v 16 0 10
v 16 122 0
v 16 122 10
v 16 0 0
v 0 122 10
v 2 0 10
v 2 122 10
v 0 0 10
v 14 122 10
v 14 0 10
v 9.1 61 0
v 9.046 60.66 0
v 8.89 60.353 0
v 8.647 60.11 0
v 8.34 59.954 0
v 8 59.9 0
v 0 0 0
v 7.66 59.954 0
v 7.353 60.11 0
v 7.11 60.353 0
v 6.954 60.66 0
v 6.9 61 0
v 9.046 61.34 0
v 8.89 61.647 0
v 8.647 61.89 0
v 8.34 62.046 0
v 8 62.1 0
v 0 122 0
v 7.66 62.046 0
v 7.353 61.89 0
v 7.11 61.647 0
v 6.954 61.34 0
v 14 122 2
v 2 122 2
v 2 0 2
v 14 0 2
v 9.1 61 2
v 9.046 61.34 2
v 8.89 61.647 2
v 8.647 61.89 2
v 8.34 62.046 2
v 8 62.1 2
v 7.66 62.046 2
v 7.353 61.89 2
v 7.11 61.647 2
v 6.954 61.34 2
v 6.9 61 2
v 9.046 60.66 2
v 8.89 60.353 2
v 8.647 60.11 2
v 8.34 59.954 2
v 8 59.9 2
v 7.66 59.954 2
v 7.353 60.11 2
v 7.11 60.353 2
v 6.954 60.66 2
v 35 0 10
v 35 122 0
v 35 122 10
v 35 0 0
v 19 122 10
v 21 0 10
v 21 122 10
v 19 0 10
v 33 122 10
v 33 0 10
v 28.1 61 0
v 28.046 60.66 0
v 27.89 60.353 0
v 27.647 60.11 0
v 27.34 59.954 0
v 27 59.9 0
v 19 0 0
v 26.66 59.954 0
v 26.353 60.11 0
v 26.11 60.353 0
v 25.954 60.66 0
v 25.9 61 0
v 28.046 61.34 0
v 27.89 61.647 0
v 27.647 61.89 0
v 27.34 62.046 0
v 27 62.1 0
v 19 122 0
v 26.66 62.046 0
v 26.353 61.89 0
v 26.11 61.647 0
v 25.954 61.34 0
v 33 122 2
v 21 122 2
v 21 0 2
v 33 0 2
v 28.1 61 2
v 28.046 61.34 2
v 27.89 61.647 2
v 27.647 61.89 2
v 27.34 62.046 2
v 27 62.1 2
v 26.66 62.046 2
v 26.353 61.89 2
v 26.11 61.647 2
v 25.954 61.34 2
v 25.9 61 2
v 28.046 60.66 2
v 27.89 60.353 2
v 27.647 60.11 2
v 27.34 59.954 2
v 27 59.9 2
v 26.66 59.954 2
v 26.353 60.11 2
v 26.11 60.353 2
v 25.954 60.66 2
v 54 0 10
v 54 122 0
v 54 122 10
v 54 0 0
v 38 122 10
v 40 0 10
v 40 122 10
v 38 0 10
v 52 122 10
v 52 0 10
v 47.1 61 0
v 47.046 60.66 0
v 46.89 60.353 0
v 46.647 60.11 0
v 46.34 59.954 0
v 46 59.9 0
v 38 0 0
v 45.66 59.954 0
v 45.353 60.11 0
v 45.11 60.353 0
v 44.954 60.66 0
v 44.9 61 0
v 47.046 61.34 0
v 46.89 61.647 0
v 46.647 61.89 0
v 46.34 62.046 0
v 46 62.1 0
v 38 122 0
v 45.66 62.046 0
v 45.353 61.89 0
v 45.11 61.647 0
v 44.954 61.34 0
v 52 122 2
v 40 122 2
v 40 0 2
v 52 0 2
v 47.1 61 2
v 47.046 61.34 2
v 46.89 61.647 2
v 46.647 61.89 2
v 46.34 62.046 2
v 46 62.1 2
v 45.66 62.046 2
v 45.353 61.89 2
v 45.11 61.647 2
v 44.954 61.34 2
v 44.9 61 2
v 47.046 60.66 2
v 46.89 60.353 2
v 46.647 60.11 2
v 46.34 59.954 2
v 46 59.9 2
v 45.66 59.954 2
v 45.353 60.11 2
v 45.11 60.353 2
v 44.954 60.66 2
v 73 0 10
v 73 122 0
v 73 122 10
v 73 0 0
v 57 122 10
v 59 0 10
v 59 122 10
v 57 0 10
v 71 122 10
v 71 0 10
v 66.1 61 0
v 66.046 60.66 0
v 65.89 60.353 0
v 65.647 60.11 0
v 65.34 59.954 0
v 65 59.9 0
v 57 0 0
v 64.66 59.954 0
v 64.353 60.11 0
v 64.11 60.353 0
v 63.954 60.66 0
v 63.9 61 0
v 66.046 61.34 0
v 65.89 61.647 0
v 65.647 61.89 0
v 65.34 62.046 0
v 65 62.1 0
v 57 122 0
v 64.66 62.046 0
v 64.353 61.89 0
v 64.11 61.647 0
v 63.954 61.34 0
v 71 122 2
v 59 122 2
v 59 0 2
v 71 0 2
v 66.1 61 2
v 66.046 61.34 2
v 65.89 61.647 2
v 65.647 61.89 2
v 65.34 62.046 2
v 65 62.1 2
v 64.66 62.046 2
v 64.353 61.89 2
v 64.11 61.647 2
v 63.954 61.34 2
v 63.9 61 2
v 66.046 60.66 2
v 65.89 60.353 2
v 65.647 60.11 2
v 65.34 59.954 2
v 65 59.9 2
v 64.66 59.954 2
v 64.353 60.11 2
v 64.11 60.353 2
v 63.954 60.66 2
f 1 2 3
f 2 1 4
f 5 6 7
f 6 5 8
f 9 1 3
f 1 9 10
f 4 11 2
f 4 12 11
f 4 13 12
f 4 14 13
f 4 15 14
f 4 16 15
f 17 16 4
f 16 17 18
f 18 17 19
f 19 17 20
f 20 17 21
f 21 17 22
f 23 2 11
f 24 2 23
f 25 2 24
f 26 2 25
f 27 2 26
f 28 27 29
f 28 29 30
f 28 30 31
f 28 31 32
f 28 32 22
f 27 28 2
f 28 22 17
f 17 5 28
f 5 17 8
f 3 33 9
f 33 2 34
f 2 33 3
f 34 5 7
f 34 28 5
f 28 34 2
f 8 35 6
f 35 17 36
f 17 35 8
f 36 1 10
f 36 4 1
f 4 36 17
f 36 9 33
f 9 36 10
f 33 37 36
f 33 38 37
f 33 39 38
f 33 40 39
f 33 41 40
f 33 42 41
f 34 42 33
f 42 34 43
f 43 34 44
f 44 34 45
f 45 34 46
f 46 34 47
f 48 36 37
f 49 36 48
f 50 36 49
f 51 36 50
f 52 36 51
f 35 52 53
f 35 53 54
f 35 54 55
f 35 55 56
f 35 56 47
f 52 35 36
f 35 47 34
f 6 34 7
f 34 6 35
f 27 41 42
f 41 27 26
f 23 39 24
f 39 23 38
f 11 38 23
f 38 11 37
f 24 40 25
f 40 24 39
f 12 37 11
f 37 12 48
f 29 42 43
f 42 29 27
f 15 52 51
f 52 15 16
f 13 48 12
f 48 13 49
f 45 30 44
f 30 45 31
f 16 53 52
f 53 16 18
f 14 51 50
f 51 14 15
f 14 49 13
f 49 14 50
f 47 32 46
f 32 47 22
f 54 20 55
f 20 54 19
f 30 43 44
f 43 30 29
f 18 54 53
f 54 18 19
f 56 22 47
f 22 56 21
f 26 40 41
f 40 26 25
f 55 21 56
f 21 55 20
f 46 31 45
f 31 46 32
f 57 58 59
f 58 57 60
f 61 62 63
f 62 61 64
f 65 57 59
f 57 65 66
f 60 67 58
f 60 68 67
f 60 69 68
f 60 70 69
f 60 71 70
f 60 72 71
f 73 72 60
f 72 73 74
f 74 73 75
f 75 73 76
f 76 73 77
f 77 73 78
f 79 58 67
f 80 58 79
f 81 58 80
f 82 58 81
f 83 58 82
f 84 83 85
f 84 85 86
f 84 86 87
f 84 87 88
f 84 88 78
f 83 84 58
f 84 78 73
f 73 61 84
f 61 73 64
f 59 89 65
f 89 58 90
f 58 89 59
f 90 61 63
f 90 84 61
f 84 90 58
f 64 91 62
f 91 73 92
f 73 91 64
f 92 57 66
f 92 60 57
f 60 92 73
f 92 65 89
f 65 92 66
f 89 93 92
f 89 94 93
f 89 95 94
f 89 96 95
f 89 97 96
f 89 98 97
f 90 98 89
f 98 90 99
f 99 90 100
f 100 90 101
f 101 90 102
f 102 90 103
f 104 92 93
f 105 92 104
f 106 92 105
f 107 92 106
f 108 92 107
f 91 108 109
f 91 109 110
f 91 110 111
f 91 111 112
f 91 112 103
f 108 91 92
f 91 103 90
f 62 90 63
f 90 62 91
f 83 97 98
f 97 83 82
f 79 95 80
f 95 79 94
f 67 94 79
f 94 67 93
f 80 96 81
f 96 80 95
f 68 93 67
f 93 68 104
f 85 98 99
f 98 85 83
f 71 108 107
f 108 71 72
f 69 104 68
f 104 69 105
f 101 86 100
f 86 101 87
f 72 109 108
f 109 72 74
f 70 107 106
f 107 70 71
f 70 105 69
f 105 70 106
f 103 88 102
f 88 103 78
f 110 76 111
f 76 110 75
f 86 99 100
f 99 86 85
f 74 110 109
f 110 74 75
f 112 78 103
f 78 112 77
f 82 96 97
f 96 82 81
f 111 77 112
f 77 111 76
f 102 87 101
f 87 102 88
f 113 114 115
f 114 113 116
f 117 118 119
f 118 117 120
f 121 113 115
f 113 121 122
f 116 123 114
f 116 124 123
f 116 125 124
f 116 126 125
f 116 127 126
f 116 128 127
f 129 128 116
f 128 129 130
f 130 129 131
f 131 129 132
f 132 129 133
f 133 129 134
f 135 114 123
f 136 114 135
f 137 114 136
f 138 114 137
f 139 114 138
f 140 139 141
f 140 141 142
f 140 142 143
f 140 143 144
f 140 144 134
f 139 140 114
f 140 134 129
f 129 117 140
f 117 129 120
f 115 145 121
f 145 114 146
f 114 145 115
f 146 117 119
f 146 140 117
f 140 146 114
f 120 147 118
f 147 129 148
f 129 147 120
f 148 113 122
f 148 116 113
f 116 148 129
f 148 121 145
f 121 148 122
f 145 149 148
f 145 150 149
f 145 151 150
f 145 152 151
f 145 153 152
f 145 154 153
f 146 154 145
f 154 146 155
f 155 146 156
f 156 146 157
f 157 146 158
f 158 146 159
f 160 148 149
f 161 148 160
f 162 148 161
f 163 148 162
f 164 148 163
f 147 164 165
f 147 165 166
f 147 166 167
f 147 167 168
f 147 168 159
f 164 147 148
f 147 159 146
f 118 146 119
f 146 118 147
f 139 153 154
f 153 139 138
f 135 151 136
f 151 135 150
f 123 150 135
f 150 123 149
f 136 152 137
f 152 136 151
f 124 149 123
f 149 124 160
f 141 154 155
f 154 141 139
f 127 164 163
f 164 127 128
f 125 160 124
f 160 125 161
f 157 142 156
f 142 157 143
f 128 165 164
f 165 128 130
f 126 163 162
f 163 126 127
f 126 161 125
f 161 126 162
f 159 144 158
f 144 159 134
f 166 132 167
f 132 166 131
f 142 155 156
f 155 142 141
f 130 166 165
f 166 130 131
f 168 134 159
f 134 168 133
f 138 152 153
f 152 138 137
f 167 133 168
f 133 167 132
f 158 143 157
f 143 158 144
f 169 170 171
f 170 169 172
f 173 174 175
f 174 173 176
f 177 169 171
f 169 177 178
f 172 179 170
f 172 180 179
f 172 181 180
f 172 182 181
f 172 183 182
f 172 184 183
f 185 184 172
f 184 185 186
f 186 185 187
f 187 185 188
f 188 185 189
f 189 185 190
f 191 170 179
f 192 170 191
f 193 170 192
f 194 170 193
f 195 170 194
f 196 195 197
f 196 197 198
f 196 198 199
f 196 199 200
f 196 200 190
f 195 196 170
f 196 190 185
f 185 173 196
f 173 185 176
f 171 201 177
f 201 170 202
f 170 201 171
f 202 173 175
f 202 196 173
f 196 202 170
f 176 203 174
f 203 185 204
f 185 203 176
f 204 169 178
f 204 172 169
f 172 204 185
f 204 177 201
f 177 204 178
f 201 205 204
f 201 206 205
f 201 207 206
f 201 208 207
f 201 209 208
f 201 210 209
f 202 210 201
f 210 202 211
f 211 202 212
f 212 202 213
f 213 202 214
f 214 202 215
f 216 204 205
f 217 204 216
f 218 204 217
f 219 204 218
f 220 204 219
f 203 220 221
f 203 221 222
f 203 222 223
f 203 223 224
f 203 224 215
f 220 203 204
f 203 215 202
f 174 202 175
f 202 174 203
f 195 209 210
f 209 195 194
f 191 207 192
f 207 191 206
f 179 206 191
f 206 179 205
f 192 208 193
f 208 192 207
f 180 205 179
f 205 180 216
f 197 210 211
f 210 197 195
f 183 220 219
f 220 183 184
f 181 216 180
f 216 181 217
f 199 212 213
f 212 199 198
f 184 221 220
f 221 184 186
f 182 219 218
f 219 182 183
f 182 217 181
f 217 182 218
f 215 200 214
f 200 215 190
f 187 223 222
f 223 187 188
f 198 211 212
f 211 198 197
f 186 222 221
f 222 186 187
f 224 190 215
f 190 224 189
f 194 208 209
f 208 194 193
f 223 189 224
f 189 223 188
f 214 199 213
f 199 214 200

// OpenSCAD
// ============================================================
// PRINT: TRILHOS MANTA G3 (Posição 1 — X=50mm)
// 4 peças idênticas — canal 12mm (filtro 10mm + folga)
// Mesa: 76mm × 122mm — cabe na Ender 3 (200×200mm) ✓
// Tempo estimado: ~1h
// ============================================================
// 1 filtro × 2 laterais × 2 metades = 4 peças
// ============================================================

use <TRILHO_FILTRO.scad>

gap = 3;
canal = 12;
largura = canal + 2*2; // 16mm

// 4 peças lado a lado em X
for (i = [0:3]) {
    translate([i * (largura + gap), 0, 0])
        trilho_metade_a(canal);
}

// Guia visual da mesa (não imprime)
%translate([0, 0, -0.5])
    cube([200, 200, 0.1]);
